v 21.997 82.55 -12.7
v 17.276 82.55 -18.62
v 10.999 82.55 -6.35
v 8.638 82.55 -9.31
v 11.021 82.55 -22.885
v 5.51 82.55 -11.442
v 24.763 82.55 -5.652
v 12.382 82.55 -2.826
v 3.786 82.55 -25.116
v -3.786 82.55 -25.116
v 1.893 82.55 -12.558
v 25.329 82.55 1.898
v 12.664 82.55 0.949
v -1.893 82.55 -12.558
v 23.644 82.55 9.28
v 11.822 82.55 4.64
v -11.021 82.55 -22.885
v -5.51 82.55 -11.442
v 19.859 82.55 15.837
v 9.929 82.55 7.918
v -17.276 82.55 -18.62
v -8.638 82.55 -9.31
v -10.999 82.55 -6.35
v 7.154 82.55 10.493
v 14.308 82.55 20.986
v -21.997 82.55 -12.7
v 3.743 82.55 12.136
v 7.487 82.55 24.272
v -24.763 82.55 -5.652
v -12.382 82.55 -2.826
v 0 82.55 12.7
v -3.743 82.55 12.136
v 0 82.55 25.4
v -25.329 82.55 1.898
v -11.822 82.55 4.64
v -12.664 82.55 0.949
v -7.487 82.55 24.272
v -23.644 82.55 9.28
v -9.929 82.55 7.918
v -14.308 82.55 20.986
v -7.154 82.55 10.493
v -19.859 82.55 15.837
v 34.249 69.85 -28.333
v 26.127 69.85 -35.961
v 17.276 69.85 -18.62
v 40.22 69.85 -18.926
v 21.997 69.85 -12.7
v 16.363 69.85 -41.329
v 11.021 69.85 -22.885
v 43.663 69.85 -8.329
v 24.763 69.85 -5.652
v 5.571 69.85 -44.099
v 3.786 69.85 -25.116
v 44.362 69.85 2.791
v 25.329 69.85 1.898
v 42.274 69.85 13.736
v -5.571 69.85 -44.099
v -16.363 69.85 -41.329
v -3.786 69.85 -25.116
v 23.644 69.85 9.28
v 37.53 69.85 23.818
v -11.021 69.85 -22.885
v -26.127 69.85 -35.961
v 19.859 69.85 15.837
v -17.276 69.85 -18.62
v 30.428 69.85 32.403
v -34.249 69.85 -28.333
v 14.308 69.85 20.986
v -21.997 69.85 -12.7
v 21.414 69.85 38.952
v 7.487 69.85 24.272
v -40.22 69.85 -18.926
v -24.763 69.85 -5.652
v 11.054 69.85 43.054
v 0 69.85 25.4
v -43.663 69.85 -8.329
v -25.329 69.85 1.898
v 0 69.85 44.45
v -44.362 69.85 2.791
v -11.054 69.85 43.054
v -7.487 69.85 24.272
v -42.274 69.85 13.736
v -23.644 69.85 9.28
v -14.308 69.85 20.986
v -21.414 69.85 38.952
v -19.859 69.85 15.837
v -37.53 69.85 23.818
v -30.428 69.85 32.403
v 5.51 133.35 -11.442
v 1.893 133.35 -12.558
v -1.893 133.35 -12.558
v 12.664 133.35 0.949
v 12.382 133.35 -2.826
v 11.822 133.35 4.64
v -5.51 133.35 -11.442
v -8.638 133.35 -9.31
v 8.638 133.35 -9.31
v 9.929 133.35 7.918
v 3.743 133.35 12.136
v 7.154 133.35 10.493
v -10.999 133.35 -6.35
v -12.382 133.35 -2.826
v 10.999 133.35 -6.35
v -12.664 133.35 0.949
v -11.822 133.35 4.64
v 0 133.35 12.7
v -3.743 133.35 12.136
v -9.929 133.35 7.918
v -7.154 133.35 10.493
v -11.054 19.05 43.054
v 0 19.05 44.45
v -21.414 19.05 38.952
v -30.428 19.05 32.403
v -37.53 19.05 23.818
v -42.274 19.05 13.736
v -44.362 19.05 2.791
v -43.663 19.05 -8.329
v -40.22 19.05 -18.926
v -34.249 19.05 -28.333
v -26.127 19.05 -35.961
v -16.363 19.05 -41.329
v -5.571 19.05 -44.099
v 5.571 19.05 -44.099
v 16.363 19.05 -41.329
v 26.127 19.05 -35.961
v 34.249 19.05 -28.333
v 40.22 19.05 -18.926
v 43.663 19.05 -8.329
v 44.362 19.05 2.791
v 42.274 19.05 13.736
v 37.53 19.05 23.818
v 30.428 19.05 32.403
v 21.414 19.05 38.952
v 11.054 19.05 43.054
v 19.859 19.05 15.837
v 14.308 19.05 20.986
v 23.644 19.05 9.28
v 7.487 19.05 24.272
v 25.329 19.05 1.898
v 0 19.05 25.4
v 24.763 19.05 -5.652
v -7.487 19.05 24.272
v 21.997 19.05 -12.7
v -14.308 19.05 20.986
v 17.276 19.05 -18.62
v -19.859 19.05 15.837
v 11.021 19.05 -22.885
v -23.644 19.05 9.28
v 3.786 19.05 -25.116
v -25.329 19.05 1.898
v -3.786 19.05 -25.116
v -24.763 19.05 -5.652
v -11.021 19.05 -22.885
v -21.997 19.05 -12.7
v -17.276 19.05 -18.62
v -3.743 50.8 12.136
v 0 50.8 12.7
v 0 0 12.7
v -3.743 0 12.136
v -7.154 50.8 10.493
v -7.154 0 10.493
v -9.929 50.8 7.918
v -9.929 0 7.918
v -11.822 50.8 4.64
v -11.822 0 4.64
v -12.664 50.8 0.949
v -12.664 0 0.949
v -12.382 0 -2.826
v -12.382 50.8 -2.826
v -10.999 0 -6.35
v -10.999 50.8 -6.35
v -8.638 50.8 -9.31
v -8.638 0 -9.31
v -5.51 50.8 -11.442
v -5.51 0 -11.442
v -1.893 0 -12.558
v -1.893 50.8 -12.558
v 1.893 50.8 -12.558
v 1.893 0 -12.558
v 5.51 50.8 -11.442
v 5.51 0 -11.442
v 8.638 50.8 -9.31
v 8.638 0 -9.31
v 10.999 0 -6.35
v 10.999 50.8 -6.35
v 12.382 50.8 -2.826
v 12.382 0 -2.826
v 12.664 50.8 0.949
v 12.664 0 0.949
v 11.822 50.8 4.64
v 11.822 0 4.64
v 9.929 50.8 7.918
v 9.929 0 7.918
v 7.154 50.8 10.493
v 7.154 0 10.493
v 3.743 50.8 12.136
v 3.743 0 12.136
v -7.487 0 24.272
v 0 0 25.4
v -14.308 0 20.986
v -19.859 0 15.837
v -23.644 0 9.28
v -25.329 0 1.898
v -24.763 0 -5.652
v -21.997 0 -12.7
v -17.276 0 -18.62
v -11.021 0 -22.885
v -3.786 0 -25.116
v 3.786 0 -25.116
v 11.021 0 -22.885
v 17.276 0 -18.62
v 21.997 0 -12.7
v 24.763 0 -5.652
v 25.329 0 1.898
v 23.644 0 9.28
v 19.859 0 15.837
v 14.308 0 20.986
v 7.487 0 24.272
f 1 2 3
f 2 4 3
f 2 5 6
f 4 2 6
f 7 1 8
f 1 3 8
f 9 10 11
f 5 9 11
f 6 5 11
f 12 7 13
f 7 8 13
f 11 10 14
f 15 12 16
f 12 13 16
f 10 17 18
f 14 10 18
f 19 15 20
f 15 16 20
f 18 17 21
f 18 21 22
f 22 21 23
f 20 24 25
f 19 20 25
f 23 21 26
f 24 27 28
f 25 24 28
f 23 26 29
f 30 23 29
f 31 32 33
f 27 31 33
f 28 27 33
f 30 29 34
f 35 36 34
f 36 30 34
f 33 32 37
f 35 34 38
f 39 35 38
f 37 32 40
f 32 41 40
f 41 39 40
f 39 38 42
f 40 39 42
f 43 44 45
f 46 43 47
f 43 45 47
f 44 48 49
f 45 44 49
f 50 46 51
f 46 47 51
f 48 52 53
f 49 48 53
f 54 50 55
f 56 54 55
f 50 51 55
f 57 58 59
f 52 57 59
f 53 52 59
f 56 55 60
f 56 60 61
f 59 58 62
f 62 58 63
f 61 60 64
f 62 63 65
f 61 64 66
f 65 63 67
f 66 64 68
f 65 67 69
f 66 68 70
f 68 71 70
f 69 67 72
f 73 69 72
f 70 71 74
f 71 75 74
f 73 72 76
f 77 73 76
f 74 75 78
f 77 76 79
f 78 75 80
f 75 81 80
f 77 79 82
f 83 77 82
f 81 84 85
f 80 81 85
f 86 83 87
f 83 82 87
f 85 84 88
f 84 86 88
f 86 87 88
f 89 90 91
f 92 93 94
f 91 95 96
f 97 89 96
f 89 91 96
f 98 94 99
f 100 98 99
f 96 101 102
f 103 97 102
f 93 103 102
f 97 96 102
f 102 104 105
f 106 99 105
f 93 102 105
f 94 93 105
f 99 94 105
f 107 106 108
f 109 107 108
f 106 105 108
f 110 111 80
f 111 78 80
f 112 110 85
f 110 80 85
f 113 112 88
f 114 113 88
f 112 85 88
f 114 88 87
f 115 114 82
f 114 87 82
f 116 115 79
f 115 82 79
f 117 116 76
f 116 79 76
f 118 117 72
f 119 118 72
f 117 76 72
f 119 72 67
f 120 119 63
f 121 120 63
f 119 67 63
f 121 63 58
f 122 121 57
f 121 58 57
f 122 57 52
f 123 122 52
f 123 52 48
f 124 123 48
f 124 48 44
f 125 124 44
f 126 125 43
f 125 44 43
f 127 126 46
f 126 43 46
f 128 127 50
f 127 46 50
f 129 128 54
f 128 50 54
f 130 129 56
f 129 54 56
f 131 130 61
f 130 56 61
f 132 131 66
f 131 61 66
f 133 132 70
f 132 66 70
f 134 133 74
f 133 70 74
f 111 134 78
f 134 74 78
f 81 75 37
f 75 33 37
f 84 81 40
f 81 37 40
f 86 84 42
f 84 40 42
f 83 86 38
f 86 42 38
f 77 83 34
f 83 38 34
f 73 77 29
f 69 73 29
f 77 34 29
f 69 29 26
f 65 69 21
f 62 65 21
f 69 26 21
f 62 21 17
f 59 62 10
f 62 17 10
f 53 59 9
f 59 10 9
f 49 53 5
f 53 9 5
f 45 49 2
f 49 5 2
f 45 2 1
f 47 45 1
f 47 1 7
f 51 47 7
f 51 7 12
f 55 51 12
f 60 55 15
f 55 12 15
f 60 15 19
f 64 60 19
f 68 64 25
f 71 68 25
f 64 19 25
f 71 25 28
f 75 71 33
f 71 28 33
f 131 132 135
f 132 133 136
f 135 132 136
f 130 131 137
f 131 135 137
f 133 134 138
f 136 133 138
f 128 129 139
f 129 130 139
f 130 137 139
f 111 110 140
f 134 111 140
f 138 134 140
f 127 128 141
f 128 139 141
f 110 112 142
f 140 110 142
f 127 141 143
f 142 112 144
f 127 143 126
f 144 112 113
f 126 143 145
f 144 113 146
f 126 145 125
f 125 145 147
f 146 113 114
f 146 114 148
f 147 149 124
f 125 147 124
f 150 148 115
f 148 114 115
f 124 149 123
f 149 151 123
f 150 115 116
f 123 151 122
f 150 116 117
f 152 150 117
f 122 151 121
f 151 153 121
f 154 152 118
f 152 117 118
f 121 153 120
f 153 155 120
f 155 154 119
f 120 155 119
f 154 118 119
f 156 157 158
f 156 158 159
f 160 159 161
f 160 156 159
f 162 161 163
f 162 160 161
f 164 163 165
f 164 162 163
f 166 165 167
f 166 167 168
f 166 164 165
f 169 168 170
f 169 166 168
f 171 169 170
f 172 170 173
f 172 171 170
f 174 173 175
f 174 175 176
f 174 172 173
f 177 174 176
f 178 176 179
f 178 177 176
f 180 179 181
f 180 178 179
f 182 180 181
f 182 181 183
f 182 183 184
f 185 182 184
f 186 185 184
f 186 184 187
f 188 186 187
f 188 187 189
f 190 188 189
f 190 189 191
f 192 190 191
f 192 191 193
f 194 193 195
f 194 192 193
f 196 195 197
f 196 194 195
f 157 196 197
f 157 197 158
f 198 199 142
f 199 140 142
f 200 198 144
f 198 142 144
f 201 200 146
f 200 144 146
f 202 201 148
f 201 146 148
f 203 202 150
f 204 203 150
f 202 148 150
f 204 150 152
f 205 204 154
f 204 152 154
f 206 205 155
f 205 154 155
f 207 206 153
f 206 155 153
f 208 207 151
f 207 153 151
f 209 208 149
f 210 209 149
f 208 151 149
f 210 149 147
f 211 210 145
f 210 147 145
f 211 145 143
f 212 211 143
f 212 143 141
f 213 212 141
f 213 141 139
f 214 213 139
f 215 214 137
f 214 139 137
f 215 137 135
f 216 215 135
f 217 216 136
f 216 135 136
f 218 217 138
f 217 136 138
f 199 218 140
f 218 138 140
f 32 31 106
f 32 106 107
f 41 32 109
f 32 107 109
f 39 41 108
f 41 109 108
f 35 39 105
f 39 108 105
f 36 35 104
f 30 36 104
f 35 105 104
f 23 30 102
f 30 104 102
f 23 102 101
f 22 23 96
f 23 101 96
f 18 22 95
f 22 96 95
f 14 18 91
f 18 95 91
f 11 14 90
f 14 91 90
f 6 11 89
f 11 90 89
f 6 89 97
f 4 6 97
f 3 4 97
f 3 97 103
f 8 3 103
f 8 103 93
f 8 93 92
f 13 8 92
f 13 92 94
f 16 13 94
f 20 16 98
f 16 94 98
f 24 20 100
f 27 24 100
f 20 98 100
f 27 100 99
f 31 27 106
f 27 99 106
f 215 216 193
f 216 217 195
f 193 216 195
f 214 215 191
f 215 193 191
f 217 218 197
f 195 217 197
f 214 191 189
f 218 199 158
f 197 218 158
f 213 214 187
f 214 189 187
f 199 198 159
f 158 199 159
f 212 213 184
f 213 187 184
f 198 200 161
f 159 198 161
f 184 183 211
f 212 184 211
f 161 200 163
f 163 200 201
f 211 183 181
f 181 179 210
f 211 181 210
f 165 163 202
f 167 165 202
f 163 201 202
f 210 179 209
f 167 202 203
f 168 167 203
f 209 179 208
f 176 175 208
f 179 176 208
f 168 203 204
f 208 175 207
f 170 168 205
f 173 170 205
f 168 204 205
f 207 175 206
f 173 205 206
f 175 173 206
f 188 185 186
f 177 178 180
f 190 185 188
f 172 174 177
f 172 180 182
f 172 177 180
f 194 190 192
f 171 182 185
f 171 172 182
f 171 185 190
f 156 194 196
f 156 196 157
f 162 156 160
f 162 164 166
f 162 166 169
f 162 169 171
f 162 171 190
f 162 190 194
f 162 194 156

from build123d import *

# Parameters (mm, degrees)
CUT_EXTRUDE1_START = -50.8
SKETCH2_R          = 12.7
CUT_EXTRUDE1_DEPTH = 50.8


with BuildPart() as part:
    # Sketch1 → Base-Revolve (revolve)
    with BuildSketch(Plane.XY, mode=Mode.PRIVATE) as base_revolve_sk:
        Polygon((0, 0), (25.4, 0), (25.4, 19.05), (44.45, 19.05), (44.45, 69.85), (25.4, 69.85), (25.4, 82.55), (12.7, 82.55), (12.7, 133.35), (0, 133.35), align=None)
    revolve(base_revolve_sk.sketch.rotate(Axis((0, 0, 0), (0, -1, 0)), 90), axis=Axis((0, 0, 0), (0, -1, 0)))

    # Sketch2 → Cut-Extrude1 (cut)
    with BuildSketch(Plane.XZ.offset(CUT_EXTRUDE1_START)):
        with Locations(Location((0, 0, 0), (0, 0, 90))):
            Circle(SKETCH2_R)
    extrude(amount=CUT_EXTRUDE1_DEPTH, mode=Mode.SUBTRACT)


solid = part.part
